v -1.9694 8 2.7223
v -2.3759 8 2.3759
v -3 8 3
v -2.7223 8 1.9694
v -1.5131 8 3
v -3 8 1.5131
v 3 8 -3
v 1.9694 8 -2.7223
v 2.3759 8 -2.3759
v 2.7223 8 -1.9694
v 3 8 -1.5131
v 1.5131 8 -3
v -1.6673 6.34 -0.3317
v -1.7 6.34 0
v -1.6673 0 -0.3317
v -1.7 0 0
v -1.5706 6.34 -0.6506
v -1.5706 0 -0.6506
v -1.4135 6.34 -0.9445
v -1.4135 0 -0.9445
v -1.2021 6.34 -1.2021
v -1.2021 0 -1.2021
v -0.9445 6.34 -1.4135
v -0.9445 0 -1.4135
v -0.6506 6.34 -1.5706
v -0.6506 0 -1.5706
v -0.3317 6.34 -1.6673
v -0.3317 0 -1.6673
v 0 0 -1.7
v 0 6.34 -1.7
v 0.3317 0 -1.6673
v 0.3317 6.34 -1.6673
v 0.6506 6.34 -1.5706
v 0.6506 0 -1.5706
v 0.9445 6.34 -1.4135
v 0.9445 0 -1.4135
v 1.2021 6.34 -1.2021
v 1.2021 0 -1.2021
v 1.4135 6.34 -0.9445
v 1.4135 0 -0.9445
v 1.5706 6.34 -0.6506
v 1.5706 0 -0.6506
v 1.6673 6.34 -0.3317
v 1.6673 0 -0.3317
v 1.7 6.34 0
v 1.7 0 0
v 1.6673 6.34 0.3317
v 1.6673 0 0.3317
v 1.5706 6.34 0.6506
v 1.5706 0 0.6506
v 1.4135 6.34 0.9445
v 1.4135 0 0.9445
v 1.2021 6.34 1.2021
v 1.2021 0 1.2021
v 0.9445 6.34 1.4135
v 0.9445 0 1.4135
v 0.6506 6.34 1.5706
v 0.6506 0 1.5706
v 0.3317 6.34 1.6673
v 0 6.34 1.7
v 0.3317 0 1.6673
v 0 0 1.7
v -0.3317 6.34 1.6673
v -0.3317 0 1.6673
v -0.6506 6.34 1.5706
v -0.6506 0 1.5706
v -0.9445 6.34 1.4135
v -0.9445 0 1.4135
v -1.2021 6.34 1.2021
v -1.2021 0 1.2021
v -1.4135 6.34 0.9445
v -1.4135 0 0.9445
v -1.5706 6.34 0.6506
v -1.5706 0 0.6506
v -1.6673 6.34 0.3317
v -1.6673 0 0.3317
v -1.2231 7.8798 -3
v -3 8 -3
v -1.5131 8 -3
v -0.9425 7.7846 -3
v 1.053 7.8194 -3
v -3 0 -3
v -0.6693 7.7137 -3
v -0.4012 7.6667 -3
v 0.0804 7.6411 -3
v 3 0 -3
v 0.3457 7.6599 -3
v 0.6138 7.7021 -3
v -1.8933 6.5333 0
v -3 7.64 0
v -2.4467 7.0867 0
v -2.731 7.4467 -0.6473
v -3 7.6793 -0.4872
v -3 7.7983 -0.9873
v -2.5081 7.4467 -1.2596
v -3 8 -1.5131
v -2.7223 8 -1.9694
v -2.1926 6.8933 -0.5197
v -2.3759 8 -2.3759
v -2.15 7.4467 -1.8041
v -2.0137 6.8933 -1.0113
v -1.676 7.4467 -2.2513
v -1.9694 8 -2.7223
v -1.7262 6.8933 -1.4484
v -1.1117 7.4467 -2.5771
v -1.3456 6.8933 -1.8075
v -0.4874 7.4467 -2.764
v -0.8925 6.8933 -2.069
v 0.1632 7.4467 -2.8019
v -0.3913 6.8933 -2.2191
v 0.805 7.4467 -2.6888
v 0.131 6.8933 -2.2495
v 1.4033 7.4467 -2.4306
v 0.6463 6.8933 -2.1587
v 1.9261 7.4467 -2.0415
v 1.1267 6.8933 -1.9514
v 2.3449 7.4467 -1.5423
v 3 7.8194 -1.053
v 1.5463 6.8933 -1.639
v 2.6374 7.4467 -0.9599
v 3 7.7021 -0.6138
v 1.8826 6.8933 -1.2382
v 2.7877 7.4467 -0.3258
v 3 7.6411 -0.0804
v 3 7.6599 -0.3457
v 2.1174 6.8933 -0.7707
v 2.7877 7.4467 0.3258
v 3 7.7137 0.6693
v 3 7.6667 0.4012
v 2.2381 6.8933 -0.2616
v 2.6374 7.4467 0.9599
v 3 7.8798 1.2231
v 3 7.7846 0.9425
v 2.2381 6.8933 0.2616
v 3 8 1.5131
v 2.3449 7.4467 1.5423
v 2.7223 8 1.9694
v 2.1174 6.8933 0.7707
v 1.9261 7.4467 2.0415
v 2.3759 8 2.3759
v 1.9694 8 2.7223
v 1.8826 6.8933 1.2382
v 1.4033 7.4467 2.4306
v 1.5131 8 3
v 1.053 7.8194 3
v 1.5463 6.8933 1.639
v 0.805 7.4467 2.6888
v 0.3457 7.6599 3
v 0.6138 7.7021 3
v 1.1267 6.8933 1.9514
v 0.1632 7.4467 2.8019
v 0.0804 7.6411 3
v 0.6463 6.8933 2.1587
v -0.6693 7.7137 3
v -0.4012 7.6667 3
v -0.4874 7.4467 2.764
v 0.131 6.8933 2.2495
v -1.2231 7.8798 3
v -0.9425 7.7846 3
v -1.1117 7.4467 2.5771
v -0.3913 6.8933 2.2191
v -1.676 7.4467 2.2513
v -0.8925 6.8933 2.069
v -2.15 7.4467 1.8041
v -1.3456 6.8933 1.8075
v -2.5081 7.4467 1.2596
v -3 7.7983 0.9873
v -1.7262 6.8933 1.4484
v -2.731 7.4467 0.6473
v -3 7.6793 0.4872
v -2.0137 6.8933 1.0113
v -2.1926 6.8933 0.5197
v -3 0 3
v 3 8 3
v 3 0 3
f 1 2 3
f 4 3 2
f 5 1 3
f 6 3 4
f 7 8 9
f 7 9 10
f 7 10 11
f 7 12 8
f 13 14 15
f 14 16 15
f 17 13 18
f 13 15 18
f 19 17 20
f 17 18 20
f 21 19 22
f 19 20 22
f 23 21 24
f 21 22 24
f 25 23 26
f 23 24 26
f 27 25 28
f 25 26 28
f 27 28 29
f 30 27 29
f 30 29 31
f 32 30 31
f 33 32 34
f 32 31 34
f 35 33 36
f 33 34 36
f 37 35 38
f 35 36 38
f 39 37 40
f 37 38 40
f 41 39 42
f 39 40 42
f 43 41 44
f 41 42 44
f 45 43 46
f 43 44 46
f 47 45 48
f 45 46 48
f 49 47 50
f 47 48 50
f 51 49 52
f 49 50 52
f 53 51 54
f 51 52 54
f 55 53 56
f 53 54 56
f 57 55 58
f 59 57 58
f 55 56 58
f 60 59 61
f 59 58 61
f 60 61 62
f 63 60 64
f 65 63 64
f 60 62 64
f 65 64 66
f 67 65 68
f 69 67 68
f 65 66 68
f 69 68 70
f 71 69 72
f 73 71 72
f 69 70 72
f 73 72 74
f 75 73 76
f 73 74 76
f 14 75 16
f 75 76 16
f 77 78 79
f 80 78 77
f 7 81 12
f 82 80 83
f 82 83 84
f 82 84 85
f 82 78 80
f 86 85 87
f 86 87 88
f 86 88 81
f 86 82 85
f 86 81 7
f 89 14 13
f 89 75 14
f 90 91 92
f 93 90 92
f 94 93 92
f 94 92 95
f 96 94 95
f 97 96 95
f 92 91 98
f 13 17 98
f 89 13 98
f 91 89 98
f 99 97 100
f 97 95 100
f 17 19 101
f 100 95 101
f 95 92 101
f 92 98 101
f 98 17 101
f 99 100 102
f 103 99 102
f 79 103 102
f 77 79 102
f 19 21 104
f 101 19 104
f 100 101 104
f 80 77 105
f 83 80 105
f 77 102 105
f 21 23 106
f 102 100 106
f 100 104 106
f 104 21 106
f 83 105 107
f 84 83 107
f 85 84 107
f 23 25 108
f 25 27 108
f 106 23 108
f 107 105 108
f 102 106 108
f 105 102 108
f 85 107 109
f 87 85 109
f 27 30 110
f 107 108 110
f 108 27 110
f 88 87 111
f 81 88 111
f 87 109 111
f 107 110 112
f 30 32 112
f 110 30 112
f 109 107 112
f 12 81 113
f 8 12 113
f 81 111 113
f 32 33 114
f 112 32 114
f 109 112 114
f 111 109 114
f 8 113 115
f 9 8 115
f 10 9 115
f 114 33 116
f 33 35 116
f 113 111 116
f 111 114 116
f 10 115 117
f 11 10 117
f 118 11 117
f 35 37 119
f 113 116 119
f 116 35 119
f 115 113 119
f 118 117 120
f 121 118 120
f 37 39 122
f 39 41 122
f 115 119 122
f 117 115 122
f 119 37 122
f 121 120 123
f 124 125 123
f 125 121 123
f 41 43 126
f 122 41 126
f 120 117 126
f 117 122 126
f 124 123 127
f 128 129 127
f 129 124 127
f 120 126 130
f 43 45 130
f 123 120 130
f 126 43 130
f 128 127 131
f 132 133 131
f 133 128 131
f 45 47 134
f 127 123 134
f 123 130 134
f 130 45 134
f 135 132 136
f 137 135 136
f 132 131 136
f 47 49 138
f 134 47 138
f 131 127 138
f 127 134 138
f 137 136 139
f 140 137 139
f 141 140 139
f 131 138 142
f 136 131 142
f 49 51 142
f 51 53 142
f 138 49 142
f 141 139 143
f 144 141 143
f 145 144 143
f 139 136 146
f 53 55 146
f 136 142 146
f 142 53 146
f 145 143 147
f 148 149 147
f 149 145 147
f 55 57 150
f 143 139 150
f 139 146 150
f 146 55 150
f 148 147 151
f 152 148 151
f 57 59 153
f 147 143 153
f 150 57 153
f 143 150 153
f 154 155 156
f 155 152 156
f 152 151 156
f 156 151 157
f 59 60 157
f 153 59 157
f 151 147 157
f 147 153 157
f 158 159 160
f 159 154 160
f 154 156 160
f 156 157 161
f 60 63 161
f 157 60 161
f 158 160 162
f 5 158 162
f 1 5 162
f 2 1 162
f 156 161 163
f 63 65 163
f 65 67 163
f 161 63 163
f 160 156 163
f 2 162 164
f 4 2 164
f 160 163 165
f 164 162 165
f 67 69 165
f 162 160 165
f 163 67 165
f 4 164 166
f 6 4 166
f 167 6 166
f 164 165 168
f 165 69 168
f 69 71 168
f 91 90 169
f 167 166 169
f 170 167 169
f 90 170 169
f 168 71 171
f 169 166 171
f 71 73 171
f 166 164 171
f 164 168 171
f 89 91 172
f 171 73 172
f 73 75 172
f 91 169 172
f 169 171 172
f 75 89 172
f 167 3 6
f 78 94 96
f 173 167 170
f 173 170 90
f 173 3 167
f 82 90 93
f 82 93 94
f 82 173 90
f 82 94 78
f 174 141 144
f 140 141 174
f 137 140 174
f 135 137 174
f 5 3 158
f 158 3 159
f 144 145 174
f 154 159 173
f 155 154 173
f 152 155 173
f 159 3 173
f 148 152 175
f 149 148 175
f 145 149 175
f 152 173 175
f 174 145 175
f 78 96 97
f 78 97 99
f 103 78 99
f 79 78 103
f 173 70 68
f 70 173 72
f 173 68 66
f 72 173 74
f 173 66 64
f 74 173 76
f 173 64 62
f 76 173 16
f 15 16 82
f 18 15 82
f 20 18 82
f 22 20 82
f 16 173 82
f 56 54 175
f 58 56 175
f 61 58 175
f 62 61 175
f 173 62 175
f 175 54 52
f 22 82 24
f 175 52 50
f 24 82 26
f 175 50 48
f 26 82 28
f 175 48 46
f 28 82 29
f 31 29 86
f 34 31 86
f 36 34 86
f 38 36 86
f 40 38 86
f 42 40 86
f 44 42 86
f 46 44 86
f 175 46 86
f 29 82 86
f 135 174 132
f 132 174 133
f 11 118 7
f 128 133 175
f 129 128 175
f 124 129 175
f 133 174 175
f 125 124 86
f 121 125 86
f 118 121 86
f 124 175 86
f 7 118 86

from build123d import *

# Parameters (mm, degrees)
SKETCH1_W                     = 6
SKETCH1_H                     = 6
SKETCH1_R                     = 1.5
BOSS_EXTRUDE1_DEPTH           = 8
CSK_FOR_M3_SFHCS1_D           = 3.4
CSK_FOR_M3_SFHCS1_DEPTH       = 11.3
CSK_FOR_M3_SFHCS1_CSINK_D     = 6.72
CSK_FOR_M3_SFHCS1_CSINK_ANGLE = 90
CSK_FOR_M3_SFHCS1_TIP         = 1.021463052


with BuildPart() as part:
    # Sketch1 → Boss-Extrude1 (new body)
    with BuildSketch(Plane(origin=(0, 0, 0), x_dir=(1, 0, 0), z_dir=(0, 1, 0))):
        Rectangle(SKETCH1_W, SKETCH1_H)
        with Locations(Location((0, 0, 0), (0, 0, 270))):
            Circle(SKETCH1_R, mode=Mode.SUBTRACT)
    extrude(amount=BOSS_EXTRUDE1_DEPTH)

    # CSK for M3 SFHCS1
    with Locations(Plane(origin=(0, 8, 0), x_dir=(1, 0, 0), z_dir=(0, 1, 0))):
        with Locations((0, 0)):
            CounterSinkHole(CSK_FOR_M3_SFHCS1_D / 2, CSK_FOR_M3_SFHCS1_CSINK_D / 2, depth=CSK_FOR_M3_SFHCS1_DEPTH, counter_sink_angle=CSK_FOR_M3_SFHCS1_CSINK_ANGLE)
            with Locations((0, 0, -(CSK_FOR_M3_SFHCS1_DEPTH + CSK_FOR_M3_SFHCS1_TIP / 2))):  # 118° drill point
                Cone(0, CSK_FOR_M3_SFHCS1_D / 2, CSK_FOR_M3_SFHCS1_TIP, mode=Mode.SUBTRACT)


solid = part.part
